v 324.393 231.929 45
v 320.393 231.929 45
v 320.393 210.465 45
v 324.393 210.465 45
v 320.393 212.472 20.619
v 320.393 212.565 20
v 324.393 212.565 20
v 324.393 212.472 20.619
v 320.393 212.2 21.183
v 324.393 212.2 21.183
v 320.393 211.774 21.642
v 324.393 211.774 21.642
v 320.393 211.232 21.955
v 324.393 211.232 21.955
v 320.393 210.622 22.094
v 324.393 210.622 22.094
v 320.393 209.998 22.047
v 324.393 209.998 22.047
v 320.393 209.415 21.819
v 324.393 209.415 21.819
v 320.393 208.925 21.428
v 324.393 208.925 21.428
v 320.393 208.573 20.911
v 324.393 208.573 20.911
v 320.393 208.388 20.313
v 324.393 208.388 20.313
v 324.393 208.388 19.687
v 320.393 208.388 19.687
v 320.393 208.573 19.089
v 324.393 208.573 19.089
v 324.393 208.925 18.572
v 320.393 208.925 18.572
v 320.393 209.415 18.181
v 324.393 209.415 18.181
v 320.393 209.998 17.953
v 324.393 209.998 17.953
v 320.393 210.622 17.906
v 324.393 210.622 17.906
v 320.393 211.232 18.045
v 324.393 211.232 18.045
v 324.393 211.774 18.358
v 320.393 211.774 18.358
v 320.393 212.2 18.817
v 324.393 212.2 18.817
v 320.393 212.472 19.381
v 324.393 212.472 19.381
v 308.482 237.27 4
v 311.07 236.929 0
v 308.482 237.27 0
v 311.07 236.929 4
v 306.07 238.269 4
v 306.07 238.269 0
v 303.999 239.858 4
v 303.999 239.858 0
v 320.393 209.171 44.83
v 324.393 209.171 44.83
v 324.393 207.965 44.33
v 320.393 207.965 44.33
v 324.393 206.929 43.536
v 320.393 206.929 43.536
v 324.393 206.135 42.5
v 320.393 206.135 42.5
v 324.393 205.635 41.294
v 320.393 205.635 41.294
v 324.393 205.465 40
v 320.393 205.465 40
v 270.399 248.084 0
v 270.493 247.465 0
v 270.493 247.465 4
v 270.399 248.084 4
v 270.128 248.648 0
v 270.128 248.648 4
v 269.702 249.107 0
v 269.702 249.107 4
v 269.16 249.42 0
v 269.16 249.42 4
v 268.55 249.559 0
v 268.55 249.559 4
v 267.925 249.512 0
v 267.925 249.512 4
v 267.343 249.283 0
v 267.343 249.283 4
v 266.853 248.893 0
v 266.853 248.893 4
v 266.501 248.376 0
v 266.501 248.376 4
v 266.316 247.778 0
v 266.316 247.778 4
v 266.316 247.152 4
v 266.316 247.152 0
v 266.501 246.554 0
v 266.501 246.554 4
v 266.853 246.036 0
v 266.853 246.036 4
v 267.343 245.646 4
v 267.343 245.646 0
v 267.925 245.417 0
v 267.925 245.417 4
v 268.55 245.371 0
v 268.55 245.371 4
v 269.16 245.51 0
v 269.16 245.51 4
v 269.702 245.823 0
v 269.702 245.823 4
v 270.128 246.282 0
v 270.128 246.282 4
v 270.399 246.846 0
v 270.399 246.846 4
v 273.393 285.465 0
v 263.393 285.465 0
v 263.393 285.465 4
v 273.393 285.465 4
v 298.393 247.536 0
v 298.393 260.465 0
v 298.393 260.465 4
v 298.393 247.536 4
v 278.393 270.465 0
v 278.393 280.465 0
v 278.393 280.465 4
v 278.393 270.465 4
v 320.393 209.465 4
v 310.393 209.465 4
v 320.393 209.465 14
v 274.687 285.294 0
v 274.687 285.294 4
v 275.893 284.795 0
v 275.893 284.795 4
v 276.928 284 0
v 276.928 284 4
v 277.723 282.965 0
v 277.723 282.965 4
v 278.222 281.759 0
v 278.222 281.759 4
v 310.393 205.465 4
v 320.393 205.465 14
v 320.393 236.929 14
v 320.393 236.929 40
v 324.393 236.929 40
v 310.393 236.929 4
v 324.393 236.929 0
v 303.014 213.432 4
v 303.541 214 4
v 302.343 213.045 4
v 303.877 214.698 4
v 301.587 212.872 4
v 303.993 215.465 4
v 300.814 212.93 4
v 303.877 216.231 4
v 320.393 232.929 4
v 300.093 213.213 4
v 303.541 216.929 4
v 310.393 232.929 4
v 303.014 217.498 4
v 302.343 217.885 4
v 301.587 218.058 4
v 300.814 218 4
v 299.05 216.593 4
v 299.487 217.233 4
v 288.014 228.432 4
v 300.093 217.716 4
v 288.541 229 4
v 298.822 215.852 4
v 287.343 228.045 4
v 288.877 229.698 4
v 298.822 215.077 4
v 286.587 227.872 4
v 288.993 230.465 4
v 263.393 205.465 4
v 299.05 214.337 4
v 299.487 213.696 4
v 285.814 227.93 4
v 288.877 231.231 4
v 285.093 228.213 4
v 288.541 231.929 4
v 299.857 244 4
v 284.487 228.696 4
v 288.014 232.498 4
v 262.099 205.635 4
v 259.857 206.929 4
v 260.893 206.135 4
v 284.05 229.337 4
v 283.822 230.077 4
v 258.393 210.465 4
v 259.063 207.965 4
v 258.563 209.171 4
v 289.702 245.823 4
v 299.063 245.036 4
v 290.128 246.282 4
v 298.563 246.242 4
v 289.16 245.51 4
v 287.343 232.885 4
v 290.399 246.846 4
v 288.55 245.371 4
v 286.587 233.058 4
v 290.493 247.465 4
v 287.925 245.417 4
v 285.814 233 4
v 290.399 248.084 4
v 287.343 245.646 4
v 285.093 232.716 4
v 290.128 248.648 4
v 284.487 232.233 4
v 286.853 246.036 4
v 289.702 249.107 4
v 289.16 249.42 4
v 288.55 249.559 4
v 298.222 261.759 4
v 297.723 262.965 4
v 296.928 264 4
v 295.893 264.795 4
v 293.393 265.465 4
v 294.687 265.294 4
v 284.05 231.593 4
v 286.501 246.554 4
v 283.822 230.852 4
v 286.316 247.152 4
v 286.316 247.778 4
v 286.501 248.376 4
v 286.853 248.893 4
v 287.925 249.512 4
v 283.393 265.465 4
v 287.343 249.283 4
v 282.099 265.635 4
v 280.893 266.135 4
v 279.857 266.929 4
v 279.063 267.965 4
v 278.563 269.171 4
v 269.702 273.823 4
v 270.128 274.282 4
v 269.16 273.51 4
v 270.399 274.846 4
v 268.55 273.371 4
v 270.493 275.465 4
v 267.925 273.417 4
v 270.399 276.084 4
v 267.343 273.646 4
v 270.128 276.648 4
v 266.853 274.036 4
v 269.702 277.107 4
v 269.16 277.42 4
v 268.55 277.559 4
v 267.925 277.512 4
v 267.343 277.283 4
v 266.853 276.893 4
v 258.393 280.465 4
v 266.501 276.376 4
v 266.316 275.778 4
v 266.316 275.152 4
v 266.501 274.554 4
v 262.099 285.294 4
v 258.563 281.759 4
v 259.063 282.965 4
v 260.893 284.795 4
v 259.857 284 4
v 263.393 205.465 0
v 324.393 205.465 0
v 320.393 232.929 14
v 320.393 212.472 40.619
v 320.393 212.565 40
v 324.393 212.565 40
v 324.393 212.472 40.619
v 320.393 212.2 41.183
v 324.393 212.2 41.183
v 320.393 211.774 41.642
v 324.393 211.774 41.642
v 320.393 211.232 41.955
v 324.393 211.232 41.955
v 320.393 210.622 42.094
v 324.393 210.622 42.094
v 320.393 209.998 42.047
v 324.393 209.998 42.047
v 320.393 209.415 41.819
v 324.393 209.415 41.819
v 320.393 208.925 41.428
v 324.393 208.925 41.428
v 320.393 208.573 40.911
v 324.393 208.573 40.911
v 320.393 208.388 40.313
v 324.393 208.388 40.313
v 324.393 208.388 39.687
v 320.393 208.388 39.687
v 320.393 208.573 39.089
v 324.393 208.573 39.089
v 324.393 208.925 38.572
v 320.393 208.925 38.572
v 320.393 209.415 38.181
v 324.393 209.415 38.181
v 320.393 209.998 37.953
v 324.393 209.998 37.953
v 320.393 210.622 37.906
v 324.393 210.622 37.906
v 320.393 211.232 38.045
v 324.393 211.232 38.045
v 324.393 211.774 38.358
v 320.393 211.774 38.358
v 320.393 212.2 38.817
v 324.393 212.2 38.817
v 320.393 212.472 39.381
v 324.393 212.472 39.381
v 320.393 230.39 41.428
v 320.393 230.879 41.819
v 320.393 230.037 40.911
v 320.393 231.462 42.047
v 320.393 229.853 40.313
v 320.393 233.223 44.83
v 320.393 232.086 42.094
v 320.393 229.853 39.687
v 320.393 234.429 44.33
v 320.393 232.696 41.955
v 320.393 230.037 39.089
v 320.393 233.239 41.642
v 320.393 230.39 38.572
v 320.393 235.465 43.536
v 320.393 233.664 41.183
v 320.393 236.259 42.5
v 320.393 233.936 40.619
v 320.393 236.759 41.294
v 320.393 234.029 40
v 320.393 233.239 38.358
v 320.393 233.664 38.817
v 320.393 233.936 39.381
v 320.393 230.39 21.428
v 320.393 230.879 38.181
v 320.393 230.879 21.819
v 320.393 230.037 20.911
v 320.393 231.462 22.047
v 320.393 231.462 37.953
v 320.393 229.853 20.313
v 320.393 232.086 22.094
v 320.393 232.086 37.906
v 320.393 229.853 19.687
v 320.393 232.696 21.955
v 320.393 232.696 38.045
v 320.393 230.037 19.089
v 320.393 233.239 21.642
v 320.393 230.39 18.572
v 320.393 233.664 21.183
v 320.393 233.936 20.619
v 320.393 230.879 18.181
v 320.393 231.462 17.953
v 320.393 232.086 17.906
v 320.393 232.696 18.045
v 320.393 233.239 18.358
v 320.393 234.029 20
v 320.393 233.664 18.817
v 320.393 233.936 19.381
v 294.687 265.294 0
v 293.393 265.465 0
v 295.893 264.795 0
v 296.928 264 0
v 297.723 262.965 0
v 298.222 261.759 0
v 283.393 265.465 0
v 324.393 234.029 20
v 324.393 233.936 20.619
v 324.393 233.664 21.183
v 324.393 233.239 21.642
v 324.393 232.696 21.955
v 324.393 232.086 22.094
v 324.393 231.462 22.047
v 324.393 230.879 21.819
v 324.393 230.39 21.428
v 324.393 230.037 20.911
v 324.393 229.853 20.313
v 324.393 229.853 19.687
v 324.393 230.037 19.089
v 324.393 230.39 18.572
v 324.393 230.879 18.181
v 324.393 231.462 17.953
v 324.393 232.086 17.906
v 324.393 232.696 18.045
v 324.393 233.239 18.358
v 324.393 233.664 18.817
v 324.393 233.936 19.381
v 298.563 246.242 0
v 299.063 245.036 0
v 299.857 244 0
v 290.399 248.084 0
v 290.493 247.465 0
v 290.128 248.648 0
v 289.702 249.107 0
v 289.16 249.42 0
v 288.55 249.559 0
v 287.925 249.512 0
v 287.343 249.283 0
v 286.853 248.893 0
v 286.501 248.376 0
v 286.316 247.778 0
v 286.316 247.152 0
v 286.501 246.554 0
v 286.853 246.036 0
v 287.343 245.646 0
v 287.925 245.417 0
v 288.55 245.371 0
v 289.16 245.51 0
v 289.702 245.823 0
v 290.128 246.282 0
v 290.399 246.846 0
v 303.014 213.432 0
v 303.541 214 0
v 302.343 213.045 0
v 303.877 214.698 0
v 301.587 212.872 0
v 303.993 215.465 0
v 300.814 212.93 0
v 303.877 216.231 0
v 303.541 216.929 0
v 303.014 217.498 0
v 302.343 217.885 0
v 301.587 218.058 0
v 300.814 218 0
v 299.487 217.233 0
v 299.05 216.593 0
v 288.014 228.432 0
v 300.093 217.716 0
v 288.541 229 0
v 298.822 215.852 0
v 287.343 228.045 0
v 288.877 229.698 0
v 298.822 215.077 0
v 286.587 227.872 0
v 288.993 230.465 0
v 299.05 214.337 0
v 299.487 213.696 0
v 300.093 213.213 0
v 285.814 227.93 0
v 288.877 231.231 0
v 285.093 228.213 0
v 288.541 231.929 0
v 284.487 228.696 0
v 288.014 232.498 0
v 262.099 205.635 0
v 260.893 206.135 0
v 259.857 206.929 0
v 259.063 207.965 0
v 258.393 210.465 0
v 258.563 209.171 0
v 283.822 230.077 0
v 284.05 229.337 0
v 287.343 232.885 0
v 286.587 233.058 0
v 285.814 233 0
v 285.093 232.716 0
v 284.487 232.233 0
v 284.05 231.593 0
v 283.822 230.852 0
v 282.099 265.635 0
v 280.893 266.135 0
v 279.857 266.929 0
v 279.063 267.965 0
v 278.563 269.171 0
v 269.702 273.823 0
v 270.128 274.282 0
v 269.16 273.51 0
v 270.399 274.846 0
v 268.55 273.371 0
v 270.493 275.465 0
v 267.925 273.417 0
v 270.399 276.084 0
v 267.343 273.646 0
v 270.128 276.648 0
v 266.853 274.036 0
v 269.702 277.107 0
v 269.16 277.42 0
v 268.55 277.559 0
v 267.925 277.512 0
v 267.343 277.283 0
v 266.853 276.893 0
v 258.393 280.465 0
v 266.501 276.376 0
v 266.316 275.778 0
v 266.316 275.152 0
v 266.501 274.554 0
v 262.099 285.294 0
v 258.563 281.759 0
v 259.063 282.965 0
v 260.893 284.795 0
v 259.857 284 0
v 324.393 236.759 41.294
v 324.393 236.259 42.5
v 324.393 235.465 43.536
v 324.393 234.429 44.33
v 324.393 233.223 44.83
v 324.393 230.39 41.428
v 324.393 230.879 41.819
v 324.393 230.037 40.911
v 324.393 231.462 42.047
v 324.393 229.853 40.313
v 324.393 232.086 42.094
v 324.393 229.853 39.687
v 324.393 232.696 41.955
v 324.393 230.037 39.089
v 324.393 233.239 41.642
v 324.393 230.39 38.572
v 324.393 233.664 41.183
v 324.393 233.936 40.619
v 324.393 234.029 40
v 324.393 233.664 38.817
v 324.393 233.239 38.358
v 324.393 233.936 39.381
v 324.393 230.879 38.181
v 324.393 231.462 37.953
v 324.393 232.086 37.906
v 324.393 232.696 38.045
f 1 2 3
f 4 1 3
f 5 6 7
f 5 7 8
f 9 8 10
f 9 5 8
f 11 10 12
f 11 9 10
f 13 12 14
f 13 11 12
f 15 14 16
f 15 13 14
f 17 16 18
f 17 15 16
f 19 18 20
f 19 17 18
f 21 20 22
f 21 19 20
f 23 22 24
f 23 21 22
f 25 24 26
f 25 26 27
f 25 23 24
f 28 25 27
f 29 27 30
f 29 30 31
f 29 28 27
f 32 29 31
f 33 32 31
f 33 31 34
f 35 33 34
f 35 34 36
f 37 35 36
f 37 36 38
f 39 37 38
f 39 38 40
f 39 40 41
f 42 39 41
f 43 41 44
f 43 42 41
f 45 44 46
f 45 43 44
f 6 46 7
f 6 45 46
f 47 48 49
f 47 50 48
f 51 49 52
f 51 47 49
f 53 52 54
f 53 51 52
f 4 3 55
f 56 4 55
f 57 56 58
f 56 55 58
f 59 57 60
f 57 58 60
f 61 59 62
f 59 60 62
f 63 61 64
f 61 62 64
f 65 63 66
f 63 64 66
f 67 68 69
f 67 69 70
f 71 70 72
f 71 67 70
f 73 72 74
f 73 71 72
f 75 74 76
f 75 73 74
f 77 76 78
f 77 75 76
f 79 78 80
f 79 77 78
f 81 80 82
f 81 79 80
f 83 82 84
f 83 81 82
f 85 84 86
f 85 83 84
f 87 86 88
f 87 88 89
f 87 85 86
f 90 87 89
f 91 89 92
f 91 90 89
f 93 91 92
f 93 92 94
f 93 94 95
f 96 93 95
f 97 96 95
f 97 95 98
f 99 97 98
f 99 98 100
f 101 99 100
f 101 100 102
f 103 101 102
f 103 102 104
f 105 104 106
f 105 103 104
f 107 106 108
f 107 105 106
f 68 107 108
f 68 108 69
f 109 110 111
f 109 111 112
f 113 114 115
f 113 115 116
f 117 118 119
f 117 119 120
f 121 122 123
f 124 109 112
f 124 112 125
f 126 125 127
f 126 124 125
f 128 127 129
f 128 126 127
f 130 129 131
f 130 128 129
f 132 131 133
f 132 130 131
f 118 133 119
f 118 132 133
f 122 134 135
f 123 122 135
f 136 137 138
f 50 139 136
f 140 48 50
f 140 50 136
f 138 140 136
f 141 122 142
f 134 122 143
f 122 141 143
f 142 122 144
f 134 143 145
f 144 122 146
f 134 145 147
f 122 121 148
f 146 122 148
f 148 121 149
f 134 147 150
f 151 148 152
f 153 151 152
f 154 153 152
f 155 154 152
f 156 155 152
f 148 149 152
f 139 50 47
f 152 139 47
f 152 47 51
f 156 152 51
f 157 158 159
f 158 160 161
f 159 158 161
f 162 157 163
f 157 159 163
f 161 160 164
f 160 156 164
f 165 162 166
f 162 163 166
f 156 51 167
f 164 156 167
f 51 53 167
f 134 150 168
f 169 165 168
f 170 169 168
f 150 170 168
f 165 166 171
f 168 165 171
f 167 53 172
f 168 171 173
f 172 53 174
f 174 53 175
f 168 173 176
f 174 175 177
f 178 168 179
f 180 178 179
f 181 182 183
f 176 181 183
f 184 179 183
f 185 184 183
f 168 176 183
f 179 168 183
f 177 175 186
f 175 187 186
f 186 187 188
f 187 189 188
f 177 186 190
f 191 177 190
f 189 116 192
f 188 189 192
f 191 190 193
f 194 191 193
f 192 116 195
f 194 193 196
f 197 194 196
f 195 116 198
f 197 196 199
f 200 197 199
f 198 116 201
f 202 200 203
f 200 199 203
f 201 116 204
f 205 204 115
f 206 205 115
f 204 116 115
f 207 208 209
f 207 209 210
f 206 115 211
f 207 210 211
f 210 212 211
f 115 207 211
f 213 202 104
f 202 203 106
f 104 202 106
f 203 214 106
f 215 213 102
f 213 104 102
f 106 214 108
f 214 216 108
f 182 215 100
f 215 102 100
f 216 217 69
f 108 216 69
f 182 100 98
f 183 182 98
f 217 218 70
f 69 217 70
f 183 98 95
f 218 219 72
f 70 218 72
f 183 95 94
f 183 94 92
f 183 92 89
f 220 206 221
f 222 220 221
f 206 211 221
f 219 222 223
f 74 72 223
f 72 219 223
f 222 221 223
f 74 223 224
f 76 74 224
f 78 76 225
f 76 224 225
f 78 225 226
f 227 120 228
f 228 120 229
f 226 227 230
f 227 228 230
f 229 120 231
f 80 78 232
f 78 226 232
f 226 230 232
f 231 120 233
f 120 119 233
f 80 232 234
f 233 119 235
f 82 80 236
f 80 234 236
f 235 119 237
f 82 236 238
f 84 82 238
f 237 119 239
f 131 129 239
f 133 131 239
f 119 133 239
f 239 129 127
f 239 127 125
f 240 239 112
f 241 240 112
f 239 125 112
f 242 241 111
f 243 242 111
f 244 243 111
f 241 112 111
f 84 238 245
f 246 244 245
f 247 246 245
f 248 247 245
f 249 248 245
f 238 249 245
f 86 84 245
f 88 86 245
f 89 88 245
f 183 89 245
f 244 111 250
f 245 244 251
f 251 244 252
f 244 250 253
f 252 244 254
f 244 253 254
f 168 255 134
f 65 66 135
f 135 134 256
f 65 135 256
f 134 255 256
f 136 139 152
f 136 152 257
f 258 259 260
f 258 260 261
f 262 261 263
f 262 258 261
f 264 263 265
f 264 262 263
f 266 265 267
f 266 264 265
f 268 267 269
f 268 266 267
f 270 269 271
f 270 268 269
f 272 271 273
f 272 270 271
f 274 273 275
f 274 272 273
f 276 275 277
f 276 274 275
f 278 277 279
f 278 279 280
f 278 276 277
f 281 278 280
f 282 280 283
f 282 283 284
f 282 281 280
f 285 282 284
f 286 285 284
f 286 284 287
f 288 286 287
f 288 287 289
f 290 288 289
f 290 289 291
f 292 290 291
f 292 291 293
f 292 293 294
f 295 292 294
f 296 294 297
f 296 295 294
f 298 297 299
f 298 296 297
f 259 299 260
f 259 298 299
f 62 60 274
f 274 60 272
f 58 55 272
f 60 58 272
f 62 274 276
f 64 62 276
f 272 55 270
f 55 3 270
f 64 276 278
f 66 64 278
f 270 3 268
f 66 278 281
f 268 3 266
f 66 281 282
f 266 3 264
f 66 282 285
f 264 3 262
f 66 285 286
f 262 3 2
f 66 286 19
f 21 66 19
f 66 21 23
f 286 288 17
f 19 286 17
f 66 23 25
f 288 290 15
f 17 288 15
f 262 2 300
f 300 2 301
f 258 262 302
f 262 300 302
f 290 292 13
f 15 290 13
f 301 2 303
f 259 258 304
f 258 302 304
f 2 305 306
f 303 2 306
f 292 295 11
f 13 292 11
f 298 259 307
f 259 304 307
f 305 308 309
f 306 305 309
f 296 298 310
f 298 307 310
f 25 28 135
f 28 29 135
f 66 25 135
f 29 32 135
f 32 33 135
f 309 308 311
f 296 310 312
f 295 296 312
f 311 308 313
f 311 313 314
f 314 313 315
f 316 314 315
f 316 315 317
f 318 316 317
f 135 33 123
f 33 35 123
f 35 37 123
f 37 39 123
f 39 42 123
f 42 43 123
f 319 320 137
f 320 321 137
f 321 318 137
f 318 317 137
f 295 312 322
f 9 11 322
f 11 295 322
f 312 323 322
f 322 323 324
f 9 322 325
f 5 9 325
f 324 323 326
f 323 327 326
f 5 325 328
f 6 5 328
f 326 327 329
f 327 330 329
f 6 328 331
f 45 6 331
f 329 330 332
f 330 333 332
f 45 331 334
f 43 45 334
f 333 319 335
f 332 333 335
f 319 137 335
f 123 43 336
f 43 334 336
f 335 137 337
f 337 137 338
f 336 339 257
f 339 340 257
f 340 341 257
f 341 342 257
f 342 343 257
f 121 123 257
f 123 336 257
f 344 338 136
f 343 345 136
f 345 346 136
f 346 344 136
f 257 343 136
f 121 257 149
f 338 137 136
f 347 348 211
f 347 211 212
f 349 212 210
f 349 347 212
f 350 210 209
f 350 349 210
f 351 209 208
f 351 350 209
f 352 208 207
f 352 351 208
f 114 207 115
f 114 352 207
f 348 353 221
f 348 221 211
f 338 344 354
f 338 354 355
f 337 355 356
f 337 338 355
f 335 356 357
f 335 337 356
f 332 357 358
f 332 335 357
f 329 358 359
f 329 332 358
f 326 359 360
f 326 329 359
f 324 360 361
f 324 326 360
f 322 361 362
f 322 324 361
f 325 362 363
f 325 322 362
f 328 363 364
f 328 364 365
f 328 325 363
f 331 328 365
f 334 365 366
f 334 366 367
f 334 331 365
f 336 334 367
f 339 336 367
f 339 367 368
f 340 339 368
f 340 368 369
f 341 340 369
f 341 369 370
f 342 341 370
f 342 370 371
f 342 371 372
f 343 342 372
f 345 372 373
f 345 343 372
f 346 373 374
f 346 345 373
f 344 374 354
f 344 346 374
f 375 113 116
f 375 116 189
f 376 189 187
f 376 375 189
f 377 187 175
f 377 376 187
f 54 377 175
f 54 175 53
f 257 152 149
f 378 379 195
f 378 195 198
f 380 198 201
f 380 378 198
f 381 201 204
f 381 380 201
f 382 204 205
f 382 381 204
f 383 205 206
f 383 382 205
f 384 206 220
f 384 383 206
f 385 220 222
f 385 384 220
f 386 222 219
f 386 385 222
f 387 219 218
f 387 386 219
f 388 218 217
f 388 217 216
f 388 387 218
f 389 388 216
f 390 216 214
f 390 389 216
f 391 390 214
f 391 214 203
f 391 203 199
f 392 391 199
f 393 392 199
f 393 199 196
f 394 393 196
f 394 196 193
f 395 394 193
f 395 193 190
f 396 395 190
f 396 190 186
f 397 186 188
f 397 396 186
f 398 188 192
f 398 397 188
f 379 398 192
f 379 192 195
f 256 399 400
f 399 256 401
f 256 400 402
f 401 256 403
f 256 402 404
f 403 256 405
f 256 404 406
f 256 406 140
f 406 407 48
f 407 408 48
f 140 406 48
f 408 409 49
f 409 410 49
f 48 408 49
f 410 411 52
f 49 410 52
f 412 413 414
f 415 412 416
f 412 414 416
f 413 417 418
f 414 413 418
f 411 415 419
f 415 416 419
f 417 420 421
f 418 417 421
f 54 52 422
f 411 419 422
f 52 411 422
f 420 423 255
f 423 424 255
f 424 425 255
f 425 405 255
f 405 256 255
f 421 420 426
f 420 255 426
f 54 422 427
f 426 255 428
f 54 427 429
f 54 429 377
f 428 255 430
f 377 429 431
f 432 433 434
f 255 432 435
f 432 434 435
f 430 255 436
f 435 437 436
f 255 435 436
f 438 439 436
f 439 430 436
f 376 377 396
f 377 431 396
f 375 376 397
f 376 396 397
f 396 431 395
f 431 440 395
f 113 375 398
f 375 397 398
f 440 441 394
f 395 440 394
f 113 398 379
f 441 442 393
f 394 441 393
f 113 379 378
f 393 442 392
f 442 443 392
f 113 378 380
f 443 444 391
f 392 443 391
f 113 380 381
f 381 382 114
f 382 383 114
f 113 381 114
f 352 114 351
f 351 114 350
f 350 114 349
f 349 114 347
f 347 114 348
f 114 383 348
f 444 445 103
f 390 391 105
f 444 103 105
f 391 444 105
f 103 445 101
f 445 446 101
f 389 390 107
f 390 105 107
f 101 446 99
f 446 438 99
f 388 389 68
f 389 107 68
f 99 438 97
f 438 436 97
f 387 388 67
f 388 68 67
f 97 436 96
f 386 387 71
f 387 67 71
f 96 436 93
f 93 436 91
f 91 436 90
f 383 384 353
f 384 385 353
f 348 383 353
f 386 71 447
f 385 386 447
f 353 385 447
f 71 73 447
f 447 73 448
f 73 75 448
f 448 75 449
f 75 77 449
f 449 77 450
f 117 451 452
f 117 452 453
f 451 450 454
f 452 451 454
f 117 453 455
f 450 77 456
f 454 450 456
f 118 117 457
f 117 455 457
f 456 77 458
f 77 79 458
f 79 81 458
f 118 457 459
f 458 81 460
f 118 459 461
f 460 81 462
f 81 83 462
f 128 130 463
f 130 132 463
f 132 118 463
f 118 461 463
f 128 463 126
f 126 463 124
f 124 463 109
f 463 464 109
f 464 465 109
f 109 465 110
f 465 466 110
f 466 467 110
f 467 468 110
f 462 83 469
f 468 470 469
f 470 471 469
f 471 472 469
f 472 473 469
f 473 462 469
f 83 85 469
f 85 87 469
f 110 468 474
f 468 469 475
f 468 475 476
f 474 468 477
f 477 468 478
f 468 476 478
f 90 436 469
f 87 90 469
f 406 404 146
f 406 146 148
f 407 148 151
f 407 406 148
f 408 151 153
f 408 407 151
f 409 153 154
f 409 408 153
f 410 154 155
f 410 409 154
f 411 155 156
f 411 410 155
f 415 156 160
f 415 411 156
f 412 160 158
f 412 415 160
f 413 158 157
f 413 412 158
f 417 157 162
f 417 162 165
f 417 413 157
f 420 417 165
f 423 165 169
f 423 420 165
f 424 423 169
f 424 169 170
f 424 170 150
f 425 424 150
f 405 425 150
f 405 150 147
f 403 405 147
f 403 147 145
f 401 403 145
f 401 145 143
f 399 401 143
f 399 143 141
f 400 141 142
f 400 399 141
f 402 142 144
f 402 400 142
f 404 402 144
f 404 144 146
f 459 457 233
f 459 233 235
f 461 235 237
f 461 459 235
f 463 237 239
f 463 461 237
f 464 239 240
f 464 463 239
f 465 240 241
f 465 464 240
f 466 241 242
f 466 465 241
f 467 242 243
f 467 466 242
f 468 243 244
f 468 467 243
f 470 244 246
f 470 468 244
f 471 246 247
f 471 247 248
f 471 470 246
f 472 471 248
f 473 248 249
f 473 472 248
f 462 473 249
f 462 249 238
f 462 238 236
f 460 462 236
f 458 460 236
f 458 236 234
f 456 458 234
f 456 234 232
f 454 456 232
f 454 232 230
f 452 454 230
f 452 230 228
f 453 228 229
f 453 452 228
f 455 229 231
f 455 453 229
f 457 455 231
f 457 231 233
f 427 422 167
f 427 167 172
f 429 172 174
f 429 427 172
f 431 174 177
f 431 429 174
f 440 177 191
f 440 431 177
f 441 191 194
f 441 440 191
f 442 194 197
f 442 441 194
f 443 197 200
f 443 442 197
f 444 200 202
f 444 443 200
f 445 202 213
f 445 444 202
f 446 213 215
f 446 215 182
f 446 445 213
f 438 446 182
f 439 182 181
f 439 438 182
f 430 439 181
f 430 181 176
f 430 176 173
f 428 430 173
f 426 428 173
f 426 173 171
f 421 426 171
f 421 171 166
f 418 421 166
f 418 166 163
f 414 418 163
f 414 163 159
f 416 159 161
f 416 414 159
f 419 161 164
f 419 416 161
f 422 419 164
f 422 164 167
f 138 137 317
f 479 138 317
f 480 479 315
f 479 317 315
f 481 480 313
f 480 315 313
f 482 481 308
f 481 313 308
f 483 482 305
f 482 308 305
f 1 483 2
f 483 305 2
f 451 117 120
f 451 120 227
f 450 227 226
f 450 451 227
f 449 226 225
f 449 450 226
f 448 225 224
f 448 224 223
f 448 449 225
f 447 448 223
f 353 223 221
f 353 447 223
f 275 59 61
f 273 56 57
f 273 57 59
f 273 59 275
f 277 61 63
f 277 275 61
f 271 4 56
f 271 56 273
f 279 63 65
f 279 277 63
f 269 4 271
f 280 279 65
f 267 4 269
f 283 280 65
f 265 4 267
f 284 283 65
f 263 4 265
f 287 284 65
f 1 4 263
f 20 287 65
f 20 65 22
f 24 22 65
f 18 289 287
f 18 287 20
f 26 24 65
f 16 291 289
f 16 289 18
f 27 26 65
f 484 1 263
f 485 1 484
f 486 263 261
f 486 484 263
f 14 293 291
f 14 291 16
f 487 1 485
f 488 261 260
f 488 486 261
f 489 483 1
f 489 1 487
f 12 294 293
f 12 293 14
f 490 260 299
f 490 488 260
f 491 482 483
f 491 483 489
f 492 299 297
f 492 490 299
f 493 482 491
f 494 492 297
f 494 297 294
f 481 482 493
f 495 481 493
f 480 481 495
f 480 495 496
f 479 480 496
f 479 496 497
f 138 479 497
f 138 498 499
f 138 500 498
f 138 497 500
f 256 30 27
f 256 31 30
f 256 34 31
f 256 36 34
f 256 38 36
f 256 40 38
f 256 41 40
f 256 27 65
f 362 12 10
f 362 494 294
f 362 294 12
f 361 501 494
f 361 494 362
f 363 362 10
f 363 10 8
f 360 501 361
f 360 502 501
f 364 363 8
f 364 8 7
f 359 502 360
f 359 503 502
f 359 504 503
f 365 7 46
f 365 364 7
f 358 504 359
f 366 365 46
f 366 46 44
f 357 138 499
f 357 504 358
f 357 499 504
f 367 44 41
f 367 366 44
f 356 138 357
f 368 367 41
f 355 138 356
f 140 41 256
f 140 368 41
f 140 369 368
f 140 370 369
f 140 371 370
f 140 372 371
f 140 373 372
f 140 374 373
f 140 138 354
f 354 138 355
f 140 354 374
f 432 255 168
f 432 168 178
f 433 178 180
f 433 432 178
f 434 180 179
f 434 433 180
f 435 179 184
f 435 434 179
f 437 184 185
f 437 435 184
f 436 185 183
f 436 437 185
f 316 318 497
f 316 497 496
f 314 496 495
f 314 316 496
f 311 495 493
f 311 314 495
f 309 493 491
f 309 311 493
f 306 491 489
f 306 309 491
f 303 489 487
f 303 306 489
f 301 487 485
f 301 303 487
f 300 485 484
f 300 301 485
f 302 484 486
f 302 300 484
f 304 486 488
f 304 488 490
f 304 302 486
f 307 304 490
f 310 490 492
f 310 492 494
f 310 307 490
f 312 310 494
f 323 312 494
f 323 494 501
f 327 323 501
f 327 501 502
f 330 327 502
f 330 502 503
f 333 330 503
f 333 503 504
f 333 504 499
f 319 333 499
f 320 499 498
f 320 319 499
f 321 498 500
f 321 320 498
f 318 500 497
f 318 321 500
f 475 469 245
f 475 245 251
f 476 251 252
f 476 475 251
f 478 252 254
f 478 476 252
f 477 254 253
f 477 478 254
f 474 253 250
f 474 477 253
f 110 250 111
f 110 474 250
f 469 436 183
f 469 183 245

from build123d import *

# Parameters (mm, degrees)
MODEL_R         = 2.5999948
MODEL_R_2       = 2.0999958
EXTRUDE_1_DEPTH = 4
EXTRUDE_2_DEPTH = 4
FILLET_1_R      = 10
SKETCH_4_R      = 2.1
EXTRUDE_3_DEPTH = 4
EXTRUDE_4_DEPTH = 4


with BuildPart() as part:
    # Model → Бобышка-Вытянуть1 (new body)
    with BuildSketch(Plane.XY):
        with BuildLine():
            Line((308.392658055, 233.393719024), (308.392658055, 210.464832693))
            ThreePointArc((308.392658055, 210.464832693), (306.92819489, 206.929305859), (303.392668055, 205.464842693))
            Line((303.392668055, 205.464842693), (263.392748055, 205.464842693))
            ThreePointArc((263.392748055, 205.464842693), (259.85722122, 206.929305859), (258.392758055, 210.464832693))
            Line((258.392758055, 210.464832693), (258.392758055, 280.464692693))
            ThreePointArc((258.392758055, 280.464692693), (259.85722122, 284.000219528), (263.392748055, 285.464682693))
            Line((263.392748055, 285.464682693), (273.392728055, 285.464682693))
            ThreePointArc((273.392728055, 285.464682693), (276.92825489, 284.000219528), (278.392718055, 280.464692693))
            Line((278.392718055, 280.464692693), (278.392718055, 270.464712693))
            ThreePointArc((278.392718055, 270.464712693), (279.85718122, 266.929185859), (283.392708055, 265.464722693))
            Line((283.392708055, 265.464722693), (293.392688055, 265.464722693))
            ThreePointArc((293.392688055, 265.464722693), (296.92821489, 264.000259528), (298.392678055, 260.464732693))
            Line((298.392678055, 260.464732693), (298.392678055, 247.535826363))
            ThreePointArc((298.392678055, 247.535826363), (298.773279631, 245.622413028), (299.85714122, 244.000299528))
            Line((299.85714122, 244.000299528), (306.92819489, 236.929245859))
            ThreePointArc((306.92819489, 236.929245859), (308.012056479, 235.307132359), (308.392658055, 233.393719024))
        make_face()
        with Locations((286.392702055, 230.464792693)):
            Circle(MODEL_R, mode=Mode.SUBTRACT)
        with Locations((301.392672055, 215.464822693)):
            Circle(MODEL_R, mode=Mode.SUBTRACT)
        with Locations((268.392738055, 275.464702693)):
            Circle(MODEL_R_2, mode=Mode.SUBTRACT)
        with Locations((268.392738055, 247.464758693)):
            Circle(MODEL_R_2, mode=Mode.SUBTRACT)
        with Locations((288.392698055, 247.464758693)):
            Circle(MODEL_R_2, mode=Mode.SUBTRACT)
    extrude(amount=EXTRUDE_1_DEPTH)

    # Эскиз1 → Бобышка-Вытянуть2 (add)
    with BuildSketch(Plane(origin=(0, 0, 0), x_dir=(-1, 0, 0), z_dir=(0, 0, -1))):
        with BuildLine():
            Line((-308.392658055, 210.464832693), (-308.392658055, 232.615855145))
            Line((-308.392658055, 232.615855145), (-308.392658055, 233.393719024))
            ThreePointArc((-308.392658055, 233.393719024), (-308.012056479, 235.307132359), (-306.92819489, 236.929245859))
            Line((-306.92819489, 236.929245859), (-308.392658055, 236.929245859))
            Line((-308.392658055, 236.929245859), (-320.392658055, 236.929245859))
            Line((-320.392658055, 236.929245859), (-320.392658055, 205.464842693))
            Line((-320.392658055, 205.464842693), (-308.392658055, 205.464842693))
            Line((-308.392658055, 205.464842693), (-303.392668055, 205.464842693))
            ThreePointArc((-303.392668055, 205.464842693), (-306.92819489, 206.929305859), (-308.392658055, 210.464832693))
        make_face()
    extrude(amount=-EXTRUDE_2_DEPTH)

    # Скругление1
    fillet_1_edges = [part.edges().sort_by_distance(p)[0] for p in [
        (306.92819489, 236.929245859, 2),
    ]]
    fillet(fillet_1_edges, radius=FILLET_1_R)

    # Эскиз4 → Бобышка-Вытянуть3 (add)
    with BuildSketch(Plane(origin=(320.392658055, 0, 0), x_dir=(0, 0, -1), z_dir=(1, 0, 0))):
        with BuildLine():
            Line((0, 236.929245859), (-40, 236.929245859))
            ThreePointArc((-40, 236.929245859), (-43.535533906, 235.464779764), (-45, 231.929245859))
            Line((-45, 231.929245859), (-45, 210.464842693))
            ThreePointArc((-45, 210.464842693), (-43.535533906, 206.929308787), (-40, 205.464842693))
            Line((-40, 205.464842693), (0, 205.464842693))
            Line((0, 205.464842693), (0, 236.929245859))
        make_face()
        with Locations(Location((-40, 231.929245859, 0), (0, 0, 90))):
            Circle(SKETCH_4_R, mode=Mode.SUBTRACT)
        with Locations(Location((-40, 210.464842693, 0), (0, 0, 90))):
            Circle(SKETCH_4_R, mode=Mode.SUBTRACT)
        with Locations(Location((-20, 231.929245859, 0), (0, 0, 90))):
            Circle(SKETCH_4_R, mode=Mode.SUBTRACT)
        with Locations(Location((-20, 210.464842693, 0), (0, 0, 90))):
            Circle(SKETCH_4_R, mode=Mode.SUBTRACT)
    extrude(amount=EXTRUDE_3_DEPTH)

    # Эскиз5 → Бобышка-Вытянуть4 (add)
    with BuildSketch(Plane(origin=(0, 236.929245859, 0), x_dir=(1, 0, 0), z_dir=(0, 1, 0))):
        Polygon((320.392658055, -4), (310.392658055, -4), (320.392658055, -14), align=None)
    extrude_4 = extrude(amount=-EXTRUDE_4_DEPTH)

    # Зеркальное отражение1: Бобышка-Вытянуть4 across plane
    add(extrude_4.mirror(Plane.ZX.offset(221.197044276)))


solid = part.part
